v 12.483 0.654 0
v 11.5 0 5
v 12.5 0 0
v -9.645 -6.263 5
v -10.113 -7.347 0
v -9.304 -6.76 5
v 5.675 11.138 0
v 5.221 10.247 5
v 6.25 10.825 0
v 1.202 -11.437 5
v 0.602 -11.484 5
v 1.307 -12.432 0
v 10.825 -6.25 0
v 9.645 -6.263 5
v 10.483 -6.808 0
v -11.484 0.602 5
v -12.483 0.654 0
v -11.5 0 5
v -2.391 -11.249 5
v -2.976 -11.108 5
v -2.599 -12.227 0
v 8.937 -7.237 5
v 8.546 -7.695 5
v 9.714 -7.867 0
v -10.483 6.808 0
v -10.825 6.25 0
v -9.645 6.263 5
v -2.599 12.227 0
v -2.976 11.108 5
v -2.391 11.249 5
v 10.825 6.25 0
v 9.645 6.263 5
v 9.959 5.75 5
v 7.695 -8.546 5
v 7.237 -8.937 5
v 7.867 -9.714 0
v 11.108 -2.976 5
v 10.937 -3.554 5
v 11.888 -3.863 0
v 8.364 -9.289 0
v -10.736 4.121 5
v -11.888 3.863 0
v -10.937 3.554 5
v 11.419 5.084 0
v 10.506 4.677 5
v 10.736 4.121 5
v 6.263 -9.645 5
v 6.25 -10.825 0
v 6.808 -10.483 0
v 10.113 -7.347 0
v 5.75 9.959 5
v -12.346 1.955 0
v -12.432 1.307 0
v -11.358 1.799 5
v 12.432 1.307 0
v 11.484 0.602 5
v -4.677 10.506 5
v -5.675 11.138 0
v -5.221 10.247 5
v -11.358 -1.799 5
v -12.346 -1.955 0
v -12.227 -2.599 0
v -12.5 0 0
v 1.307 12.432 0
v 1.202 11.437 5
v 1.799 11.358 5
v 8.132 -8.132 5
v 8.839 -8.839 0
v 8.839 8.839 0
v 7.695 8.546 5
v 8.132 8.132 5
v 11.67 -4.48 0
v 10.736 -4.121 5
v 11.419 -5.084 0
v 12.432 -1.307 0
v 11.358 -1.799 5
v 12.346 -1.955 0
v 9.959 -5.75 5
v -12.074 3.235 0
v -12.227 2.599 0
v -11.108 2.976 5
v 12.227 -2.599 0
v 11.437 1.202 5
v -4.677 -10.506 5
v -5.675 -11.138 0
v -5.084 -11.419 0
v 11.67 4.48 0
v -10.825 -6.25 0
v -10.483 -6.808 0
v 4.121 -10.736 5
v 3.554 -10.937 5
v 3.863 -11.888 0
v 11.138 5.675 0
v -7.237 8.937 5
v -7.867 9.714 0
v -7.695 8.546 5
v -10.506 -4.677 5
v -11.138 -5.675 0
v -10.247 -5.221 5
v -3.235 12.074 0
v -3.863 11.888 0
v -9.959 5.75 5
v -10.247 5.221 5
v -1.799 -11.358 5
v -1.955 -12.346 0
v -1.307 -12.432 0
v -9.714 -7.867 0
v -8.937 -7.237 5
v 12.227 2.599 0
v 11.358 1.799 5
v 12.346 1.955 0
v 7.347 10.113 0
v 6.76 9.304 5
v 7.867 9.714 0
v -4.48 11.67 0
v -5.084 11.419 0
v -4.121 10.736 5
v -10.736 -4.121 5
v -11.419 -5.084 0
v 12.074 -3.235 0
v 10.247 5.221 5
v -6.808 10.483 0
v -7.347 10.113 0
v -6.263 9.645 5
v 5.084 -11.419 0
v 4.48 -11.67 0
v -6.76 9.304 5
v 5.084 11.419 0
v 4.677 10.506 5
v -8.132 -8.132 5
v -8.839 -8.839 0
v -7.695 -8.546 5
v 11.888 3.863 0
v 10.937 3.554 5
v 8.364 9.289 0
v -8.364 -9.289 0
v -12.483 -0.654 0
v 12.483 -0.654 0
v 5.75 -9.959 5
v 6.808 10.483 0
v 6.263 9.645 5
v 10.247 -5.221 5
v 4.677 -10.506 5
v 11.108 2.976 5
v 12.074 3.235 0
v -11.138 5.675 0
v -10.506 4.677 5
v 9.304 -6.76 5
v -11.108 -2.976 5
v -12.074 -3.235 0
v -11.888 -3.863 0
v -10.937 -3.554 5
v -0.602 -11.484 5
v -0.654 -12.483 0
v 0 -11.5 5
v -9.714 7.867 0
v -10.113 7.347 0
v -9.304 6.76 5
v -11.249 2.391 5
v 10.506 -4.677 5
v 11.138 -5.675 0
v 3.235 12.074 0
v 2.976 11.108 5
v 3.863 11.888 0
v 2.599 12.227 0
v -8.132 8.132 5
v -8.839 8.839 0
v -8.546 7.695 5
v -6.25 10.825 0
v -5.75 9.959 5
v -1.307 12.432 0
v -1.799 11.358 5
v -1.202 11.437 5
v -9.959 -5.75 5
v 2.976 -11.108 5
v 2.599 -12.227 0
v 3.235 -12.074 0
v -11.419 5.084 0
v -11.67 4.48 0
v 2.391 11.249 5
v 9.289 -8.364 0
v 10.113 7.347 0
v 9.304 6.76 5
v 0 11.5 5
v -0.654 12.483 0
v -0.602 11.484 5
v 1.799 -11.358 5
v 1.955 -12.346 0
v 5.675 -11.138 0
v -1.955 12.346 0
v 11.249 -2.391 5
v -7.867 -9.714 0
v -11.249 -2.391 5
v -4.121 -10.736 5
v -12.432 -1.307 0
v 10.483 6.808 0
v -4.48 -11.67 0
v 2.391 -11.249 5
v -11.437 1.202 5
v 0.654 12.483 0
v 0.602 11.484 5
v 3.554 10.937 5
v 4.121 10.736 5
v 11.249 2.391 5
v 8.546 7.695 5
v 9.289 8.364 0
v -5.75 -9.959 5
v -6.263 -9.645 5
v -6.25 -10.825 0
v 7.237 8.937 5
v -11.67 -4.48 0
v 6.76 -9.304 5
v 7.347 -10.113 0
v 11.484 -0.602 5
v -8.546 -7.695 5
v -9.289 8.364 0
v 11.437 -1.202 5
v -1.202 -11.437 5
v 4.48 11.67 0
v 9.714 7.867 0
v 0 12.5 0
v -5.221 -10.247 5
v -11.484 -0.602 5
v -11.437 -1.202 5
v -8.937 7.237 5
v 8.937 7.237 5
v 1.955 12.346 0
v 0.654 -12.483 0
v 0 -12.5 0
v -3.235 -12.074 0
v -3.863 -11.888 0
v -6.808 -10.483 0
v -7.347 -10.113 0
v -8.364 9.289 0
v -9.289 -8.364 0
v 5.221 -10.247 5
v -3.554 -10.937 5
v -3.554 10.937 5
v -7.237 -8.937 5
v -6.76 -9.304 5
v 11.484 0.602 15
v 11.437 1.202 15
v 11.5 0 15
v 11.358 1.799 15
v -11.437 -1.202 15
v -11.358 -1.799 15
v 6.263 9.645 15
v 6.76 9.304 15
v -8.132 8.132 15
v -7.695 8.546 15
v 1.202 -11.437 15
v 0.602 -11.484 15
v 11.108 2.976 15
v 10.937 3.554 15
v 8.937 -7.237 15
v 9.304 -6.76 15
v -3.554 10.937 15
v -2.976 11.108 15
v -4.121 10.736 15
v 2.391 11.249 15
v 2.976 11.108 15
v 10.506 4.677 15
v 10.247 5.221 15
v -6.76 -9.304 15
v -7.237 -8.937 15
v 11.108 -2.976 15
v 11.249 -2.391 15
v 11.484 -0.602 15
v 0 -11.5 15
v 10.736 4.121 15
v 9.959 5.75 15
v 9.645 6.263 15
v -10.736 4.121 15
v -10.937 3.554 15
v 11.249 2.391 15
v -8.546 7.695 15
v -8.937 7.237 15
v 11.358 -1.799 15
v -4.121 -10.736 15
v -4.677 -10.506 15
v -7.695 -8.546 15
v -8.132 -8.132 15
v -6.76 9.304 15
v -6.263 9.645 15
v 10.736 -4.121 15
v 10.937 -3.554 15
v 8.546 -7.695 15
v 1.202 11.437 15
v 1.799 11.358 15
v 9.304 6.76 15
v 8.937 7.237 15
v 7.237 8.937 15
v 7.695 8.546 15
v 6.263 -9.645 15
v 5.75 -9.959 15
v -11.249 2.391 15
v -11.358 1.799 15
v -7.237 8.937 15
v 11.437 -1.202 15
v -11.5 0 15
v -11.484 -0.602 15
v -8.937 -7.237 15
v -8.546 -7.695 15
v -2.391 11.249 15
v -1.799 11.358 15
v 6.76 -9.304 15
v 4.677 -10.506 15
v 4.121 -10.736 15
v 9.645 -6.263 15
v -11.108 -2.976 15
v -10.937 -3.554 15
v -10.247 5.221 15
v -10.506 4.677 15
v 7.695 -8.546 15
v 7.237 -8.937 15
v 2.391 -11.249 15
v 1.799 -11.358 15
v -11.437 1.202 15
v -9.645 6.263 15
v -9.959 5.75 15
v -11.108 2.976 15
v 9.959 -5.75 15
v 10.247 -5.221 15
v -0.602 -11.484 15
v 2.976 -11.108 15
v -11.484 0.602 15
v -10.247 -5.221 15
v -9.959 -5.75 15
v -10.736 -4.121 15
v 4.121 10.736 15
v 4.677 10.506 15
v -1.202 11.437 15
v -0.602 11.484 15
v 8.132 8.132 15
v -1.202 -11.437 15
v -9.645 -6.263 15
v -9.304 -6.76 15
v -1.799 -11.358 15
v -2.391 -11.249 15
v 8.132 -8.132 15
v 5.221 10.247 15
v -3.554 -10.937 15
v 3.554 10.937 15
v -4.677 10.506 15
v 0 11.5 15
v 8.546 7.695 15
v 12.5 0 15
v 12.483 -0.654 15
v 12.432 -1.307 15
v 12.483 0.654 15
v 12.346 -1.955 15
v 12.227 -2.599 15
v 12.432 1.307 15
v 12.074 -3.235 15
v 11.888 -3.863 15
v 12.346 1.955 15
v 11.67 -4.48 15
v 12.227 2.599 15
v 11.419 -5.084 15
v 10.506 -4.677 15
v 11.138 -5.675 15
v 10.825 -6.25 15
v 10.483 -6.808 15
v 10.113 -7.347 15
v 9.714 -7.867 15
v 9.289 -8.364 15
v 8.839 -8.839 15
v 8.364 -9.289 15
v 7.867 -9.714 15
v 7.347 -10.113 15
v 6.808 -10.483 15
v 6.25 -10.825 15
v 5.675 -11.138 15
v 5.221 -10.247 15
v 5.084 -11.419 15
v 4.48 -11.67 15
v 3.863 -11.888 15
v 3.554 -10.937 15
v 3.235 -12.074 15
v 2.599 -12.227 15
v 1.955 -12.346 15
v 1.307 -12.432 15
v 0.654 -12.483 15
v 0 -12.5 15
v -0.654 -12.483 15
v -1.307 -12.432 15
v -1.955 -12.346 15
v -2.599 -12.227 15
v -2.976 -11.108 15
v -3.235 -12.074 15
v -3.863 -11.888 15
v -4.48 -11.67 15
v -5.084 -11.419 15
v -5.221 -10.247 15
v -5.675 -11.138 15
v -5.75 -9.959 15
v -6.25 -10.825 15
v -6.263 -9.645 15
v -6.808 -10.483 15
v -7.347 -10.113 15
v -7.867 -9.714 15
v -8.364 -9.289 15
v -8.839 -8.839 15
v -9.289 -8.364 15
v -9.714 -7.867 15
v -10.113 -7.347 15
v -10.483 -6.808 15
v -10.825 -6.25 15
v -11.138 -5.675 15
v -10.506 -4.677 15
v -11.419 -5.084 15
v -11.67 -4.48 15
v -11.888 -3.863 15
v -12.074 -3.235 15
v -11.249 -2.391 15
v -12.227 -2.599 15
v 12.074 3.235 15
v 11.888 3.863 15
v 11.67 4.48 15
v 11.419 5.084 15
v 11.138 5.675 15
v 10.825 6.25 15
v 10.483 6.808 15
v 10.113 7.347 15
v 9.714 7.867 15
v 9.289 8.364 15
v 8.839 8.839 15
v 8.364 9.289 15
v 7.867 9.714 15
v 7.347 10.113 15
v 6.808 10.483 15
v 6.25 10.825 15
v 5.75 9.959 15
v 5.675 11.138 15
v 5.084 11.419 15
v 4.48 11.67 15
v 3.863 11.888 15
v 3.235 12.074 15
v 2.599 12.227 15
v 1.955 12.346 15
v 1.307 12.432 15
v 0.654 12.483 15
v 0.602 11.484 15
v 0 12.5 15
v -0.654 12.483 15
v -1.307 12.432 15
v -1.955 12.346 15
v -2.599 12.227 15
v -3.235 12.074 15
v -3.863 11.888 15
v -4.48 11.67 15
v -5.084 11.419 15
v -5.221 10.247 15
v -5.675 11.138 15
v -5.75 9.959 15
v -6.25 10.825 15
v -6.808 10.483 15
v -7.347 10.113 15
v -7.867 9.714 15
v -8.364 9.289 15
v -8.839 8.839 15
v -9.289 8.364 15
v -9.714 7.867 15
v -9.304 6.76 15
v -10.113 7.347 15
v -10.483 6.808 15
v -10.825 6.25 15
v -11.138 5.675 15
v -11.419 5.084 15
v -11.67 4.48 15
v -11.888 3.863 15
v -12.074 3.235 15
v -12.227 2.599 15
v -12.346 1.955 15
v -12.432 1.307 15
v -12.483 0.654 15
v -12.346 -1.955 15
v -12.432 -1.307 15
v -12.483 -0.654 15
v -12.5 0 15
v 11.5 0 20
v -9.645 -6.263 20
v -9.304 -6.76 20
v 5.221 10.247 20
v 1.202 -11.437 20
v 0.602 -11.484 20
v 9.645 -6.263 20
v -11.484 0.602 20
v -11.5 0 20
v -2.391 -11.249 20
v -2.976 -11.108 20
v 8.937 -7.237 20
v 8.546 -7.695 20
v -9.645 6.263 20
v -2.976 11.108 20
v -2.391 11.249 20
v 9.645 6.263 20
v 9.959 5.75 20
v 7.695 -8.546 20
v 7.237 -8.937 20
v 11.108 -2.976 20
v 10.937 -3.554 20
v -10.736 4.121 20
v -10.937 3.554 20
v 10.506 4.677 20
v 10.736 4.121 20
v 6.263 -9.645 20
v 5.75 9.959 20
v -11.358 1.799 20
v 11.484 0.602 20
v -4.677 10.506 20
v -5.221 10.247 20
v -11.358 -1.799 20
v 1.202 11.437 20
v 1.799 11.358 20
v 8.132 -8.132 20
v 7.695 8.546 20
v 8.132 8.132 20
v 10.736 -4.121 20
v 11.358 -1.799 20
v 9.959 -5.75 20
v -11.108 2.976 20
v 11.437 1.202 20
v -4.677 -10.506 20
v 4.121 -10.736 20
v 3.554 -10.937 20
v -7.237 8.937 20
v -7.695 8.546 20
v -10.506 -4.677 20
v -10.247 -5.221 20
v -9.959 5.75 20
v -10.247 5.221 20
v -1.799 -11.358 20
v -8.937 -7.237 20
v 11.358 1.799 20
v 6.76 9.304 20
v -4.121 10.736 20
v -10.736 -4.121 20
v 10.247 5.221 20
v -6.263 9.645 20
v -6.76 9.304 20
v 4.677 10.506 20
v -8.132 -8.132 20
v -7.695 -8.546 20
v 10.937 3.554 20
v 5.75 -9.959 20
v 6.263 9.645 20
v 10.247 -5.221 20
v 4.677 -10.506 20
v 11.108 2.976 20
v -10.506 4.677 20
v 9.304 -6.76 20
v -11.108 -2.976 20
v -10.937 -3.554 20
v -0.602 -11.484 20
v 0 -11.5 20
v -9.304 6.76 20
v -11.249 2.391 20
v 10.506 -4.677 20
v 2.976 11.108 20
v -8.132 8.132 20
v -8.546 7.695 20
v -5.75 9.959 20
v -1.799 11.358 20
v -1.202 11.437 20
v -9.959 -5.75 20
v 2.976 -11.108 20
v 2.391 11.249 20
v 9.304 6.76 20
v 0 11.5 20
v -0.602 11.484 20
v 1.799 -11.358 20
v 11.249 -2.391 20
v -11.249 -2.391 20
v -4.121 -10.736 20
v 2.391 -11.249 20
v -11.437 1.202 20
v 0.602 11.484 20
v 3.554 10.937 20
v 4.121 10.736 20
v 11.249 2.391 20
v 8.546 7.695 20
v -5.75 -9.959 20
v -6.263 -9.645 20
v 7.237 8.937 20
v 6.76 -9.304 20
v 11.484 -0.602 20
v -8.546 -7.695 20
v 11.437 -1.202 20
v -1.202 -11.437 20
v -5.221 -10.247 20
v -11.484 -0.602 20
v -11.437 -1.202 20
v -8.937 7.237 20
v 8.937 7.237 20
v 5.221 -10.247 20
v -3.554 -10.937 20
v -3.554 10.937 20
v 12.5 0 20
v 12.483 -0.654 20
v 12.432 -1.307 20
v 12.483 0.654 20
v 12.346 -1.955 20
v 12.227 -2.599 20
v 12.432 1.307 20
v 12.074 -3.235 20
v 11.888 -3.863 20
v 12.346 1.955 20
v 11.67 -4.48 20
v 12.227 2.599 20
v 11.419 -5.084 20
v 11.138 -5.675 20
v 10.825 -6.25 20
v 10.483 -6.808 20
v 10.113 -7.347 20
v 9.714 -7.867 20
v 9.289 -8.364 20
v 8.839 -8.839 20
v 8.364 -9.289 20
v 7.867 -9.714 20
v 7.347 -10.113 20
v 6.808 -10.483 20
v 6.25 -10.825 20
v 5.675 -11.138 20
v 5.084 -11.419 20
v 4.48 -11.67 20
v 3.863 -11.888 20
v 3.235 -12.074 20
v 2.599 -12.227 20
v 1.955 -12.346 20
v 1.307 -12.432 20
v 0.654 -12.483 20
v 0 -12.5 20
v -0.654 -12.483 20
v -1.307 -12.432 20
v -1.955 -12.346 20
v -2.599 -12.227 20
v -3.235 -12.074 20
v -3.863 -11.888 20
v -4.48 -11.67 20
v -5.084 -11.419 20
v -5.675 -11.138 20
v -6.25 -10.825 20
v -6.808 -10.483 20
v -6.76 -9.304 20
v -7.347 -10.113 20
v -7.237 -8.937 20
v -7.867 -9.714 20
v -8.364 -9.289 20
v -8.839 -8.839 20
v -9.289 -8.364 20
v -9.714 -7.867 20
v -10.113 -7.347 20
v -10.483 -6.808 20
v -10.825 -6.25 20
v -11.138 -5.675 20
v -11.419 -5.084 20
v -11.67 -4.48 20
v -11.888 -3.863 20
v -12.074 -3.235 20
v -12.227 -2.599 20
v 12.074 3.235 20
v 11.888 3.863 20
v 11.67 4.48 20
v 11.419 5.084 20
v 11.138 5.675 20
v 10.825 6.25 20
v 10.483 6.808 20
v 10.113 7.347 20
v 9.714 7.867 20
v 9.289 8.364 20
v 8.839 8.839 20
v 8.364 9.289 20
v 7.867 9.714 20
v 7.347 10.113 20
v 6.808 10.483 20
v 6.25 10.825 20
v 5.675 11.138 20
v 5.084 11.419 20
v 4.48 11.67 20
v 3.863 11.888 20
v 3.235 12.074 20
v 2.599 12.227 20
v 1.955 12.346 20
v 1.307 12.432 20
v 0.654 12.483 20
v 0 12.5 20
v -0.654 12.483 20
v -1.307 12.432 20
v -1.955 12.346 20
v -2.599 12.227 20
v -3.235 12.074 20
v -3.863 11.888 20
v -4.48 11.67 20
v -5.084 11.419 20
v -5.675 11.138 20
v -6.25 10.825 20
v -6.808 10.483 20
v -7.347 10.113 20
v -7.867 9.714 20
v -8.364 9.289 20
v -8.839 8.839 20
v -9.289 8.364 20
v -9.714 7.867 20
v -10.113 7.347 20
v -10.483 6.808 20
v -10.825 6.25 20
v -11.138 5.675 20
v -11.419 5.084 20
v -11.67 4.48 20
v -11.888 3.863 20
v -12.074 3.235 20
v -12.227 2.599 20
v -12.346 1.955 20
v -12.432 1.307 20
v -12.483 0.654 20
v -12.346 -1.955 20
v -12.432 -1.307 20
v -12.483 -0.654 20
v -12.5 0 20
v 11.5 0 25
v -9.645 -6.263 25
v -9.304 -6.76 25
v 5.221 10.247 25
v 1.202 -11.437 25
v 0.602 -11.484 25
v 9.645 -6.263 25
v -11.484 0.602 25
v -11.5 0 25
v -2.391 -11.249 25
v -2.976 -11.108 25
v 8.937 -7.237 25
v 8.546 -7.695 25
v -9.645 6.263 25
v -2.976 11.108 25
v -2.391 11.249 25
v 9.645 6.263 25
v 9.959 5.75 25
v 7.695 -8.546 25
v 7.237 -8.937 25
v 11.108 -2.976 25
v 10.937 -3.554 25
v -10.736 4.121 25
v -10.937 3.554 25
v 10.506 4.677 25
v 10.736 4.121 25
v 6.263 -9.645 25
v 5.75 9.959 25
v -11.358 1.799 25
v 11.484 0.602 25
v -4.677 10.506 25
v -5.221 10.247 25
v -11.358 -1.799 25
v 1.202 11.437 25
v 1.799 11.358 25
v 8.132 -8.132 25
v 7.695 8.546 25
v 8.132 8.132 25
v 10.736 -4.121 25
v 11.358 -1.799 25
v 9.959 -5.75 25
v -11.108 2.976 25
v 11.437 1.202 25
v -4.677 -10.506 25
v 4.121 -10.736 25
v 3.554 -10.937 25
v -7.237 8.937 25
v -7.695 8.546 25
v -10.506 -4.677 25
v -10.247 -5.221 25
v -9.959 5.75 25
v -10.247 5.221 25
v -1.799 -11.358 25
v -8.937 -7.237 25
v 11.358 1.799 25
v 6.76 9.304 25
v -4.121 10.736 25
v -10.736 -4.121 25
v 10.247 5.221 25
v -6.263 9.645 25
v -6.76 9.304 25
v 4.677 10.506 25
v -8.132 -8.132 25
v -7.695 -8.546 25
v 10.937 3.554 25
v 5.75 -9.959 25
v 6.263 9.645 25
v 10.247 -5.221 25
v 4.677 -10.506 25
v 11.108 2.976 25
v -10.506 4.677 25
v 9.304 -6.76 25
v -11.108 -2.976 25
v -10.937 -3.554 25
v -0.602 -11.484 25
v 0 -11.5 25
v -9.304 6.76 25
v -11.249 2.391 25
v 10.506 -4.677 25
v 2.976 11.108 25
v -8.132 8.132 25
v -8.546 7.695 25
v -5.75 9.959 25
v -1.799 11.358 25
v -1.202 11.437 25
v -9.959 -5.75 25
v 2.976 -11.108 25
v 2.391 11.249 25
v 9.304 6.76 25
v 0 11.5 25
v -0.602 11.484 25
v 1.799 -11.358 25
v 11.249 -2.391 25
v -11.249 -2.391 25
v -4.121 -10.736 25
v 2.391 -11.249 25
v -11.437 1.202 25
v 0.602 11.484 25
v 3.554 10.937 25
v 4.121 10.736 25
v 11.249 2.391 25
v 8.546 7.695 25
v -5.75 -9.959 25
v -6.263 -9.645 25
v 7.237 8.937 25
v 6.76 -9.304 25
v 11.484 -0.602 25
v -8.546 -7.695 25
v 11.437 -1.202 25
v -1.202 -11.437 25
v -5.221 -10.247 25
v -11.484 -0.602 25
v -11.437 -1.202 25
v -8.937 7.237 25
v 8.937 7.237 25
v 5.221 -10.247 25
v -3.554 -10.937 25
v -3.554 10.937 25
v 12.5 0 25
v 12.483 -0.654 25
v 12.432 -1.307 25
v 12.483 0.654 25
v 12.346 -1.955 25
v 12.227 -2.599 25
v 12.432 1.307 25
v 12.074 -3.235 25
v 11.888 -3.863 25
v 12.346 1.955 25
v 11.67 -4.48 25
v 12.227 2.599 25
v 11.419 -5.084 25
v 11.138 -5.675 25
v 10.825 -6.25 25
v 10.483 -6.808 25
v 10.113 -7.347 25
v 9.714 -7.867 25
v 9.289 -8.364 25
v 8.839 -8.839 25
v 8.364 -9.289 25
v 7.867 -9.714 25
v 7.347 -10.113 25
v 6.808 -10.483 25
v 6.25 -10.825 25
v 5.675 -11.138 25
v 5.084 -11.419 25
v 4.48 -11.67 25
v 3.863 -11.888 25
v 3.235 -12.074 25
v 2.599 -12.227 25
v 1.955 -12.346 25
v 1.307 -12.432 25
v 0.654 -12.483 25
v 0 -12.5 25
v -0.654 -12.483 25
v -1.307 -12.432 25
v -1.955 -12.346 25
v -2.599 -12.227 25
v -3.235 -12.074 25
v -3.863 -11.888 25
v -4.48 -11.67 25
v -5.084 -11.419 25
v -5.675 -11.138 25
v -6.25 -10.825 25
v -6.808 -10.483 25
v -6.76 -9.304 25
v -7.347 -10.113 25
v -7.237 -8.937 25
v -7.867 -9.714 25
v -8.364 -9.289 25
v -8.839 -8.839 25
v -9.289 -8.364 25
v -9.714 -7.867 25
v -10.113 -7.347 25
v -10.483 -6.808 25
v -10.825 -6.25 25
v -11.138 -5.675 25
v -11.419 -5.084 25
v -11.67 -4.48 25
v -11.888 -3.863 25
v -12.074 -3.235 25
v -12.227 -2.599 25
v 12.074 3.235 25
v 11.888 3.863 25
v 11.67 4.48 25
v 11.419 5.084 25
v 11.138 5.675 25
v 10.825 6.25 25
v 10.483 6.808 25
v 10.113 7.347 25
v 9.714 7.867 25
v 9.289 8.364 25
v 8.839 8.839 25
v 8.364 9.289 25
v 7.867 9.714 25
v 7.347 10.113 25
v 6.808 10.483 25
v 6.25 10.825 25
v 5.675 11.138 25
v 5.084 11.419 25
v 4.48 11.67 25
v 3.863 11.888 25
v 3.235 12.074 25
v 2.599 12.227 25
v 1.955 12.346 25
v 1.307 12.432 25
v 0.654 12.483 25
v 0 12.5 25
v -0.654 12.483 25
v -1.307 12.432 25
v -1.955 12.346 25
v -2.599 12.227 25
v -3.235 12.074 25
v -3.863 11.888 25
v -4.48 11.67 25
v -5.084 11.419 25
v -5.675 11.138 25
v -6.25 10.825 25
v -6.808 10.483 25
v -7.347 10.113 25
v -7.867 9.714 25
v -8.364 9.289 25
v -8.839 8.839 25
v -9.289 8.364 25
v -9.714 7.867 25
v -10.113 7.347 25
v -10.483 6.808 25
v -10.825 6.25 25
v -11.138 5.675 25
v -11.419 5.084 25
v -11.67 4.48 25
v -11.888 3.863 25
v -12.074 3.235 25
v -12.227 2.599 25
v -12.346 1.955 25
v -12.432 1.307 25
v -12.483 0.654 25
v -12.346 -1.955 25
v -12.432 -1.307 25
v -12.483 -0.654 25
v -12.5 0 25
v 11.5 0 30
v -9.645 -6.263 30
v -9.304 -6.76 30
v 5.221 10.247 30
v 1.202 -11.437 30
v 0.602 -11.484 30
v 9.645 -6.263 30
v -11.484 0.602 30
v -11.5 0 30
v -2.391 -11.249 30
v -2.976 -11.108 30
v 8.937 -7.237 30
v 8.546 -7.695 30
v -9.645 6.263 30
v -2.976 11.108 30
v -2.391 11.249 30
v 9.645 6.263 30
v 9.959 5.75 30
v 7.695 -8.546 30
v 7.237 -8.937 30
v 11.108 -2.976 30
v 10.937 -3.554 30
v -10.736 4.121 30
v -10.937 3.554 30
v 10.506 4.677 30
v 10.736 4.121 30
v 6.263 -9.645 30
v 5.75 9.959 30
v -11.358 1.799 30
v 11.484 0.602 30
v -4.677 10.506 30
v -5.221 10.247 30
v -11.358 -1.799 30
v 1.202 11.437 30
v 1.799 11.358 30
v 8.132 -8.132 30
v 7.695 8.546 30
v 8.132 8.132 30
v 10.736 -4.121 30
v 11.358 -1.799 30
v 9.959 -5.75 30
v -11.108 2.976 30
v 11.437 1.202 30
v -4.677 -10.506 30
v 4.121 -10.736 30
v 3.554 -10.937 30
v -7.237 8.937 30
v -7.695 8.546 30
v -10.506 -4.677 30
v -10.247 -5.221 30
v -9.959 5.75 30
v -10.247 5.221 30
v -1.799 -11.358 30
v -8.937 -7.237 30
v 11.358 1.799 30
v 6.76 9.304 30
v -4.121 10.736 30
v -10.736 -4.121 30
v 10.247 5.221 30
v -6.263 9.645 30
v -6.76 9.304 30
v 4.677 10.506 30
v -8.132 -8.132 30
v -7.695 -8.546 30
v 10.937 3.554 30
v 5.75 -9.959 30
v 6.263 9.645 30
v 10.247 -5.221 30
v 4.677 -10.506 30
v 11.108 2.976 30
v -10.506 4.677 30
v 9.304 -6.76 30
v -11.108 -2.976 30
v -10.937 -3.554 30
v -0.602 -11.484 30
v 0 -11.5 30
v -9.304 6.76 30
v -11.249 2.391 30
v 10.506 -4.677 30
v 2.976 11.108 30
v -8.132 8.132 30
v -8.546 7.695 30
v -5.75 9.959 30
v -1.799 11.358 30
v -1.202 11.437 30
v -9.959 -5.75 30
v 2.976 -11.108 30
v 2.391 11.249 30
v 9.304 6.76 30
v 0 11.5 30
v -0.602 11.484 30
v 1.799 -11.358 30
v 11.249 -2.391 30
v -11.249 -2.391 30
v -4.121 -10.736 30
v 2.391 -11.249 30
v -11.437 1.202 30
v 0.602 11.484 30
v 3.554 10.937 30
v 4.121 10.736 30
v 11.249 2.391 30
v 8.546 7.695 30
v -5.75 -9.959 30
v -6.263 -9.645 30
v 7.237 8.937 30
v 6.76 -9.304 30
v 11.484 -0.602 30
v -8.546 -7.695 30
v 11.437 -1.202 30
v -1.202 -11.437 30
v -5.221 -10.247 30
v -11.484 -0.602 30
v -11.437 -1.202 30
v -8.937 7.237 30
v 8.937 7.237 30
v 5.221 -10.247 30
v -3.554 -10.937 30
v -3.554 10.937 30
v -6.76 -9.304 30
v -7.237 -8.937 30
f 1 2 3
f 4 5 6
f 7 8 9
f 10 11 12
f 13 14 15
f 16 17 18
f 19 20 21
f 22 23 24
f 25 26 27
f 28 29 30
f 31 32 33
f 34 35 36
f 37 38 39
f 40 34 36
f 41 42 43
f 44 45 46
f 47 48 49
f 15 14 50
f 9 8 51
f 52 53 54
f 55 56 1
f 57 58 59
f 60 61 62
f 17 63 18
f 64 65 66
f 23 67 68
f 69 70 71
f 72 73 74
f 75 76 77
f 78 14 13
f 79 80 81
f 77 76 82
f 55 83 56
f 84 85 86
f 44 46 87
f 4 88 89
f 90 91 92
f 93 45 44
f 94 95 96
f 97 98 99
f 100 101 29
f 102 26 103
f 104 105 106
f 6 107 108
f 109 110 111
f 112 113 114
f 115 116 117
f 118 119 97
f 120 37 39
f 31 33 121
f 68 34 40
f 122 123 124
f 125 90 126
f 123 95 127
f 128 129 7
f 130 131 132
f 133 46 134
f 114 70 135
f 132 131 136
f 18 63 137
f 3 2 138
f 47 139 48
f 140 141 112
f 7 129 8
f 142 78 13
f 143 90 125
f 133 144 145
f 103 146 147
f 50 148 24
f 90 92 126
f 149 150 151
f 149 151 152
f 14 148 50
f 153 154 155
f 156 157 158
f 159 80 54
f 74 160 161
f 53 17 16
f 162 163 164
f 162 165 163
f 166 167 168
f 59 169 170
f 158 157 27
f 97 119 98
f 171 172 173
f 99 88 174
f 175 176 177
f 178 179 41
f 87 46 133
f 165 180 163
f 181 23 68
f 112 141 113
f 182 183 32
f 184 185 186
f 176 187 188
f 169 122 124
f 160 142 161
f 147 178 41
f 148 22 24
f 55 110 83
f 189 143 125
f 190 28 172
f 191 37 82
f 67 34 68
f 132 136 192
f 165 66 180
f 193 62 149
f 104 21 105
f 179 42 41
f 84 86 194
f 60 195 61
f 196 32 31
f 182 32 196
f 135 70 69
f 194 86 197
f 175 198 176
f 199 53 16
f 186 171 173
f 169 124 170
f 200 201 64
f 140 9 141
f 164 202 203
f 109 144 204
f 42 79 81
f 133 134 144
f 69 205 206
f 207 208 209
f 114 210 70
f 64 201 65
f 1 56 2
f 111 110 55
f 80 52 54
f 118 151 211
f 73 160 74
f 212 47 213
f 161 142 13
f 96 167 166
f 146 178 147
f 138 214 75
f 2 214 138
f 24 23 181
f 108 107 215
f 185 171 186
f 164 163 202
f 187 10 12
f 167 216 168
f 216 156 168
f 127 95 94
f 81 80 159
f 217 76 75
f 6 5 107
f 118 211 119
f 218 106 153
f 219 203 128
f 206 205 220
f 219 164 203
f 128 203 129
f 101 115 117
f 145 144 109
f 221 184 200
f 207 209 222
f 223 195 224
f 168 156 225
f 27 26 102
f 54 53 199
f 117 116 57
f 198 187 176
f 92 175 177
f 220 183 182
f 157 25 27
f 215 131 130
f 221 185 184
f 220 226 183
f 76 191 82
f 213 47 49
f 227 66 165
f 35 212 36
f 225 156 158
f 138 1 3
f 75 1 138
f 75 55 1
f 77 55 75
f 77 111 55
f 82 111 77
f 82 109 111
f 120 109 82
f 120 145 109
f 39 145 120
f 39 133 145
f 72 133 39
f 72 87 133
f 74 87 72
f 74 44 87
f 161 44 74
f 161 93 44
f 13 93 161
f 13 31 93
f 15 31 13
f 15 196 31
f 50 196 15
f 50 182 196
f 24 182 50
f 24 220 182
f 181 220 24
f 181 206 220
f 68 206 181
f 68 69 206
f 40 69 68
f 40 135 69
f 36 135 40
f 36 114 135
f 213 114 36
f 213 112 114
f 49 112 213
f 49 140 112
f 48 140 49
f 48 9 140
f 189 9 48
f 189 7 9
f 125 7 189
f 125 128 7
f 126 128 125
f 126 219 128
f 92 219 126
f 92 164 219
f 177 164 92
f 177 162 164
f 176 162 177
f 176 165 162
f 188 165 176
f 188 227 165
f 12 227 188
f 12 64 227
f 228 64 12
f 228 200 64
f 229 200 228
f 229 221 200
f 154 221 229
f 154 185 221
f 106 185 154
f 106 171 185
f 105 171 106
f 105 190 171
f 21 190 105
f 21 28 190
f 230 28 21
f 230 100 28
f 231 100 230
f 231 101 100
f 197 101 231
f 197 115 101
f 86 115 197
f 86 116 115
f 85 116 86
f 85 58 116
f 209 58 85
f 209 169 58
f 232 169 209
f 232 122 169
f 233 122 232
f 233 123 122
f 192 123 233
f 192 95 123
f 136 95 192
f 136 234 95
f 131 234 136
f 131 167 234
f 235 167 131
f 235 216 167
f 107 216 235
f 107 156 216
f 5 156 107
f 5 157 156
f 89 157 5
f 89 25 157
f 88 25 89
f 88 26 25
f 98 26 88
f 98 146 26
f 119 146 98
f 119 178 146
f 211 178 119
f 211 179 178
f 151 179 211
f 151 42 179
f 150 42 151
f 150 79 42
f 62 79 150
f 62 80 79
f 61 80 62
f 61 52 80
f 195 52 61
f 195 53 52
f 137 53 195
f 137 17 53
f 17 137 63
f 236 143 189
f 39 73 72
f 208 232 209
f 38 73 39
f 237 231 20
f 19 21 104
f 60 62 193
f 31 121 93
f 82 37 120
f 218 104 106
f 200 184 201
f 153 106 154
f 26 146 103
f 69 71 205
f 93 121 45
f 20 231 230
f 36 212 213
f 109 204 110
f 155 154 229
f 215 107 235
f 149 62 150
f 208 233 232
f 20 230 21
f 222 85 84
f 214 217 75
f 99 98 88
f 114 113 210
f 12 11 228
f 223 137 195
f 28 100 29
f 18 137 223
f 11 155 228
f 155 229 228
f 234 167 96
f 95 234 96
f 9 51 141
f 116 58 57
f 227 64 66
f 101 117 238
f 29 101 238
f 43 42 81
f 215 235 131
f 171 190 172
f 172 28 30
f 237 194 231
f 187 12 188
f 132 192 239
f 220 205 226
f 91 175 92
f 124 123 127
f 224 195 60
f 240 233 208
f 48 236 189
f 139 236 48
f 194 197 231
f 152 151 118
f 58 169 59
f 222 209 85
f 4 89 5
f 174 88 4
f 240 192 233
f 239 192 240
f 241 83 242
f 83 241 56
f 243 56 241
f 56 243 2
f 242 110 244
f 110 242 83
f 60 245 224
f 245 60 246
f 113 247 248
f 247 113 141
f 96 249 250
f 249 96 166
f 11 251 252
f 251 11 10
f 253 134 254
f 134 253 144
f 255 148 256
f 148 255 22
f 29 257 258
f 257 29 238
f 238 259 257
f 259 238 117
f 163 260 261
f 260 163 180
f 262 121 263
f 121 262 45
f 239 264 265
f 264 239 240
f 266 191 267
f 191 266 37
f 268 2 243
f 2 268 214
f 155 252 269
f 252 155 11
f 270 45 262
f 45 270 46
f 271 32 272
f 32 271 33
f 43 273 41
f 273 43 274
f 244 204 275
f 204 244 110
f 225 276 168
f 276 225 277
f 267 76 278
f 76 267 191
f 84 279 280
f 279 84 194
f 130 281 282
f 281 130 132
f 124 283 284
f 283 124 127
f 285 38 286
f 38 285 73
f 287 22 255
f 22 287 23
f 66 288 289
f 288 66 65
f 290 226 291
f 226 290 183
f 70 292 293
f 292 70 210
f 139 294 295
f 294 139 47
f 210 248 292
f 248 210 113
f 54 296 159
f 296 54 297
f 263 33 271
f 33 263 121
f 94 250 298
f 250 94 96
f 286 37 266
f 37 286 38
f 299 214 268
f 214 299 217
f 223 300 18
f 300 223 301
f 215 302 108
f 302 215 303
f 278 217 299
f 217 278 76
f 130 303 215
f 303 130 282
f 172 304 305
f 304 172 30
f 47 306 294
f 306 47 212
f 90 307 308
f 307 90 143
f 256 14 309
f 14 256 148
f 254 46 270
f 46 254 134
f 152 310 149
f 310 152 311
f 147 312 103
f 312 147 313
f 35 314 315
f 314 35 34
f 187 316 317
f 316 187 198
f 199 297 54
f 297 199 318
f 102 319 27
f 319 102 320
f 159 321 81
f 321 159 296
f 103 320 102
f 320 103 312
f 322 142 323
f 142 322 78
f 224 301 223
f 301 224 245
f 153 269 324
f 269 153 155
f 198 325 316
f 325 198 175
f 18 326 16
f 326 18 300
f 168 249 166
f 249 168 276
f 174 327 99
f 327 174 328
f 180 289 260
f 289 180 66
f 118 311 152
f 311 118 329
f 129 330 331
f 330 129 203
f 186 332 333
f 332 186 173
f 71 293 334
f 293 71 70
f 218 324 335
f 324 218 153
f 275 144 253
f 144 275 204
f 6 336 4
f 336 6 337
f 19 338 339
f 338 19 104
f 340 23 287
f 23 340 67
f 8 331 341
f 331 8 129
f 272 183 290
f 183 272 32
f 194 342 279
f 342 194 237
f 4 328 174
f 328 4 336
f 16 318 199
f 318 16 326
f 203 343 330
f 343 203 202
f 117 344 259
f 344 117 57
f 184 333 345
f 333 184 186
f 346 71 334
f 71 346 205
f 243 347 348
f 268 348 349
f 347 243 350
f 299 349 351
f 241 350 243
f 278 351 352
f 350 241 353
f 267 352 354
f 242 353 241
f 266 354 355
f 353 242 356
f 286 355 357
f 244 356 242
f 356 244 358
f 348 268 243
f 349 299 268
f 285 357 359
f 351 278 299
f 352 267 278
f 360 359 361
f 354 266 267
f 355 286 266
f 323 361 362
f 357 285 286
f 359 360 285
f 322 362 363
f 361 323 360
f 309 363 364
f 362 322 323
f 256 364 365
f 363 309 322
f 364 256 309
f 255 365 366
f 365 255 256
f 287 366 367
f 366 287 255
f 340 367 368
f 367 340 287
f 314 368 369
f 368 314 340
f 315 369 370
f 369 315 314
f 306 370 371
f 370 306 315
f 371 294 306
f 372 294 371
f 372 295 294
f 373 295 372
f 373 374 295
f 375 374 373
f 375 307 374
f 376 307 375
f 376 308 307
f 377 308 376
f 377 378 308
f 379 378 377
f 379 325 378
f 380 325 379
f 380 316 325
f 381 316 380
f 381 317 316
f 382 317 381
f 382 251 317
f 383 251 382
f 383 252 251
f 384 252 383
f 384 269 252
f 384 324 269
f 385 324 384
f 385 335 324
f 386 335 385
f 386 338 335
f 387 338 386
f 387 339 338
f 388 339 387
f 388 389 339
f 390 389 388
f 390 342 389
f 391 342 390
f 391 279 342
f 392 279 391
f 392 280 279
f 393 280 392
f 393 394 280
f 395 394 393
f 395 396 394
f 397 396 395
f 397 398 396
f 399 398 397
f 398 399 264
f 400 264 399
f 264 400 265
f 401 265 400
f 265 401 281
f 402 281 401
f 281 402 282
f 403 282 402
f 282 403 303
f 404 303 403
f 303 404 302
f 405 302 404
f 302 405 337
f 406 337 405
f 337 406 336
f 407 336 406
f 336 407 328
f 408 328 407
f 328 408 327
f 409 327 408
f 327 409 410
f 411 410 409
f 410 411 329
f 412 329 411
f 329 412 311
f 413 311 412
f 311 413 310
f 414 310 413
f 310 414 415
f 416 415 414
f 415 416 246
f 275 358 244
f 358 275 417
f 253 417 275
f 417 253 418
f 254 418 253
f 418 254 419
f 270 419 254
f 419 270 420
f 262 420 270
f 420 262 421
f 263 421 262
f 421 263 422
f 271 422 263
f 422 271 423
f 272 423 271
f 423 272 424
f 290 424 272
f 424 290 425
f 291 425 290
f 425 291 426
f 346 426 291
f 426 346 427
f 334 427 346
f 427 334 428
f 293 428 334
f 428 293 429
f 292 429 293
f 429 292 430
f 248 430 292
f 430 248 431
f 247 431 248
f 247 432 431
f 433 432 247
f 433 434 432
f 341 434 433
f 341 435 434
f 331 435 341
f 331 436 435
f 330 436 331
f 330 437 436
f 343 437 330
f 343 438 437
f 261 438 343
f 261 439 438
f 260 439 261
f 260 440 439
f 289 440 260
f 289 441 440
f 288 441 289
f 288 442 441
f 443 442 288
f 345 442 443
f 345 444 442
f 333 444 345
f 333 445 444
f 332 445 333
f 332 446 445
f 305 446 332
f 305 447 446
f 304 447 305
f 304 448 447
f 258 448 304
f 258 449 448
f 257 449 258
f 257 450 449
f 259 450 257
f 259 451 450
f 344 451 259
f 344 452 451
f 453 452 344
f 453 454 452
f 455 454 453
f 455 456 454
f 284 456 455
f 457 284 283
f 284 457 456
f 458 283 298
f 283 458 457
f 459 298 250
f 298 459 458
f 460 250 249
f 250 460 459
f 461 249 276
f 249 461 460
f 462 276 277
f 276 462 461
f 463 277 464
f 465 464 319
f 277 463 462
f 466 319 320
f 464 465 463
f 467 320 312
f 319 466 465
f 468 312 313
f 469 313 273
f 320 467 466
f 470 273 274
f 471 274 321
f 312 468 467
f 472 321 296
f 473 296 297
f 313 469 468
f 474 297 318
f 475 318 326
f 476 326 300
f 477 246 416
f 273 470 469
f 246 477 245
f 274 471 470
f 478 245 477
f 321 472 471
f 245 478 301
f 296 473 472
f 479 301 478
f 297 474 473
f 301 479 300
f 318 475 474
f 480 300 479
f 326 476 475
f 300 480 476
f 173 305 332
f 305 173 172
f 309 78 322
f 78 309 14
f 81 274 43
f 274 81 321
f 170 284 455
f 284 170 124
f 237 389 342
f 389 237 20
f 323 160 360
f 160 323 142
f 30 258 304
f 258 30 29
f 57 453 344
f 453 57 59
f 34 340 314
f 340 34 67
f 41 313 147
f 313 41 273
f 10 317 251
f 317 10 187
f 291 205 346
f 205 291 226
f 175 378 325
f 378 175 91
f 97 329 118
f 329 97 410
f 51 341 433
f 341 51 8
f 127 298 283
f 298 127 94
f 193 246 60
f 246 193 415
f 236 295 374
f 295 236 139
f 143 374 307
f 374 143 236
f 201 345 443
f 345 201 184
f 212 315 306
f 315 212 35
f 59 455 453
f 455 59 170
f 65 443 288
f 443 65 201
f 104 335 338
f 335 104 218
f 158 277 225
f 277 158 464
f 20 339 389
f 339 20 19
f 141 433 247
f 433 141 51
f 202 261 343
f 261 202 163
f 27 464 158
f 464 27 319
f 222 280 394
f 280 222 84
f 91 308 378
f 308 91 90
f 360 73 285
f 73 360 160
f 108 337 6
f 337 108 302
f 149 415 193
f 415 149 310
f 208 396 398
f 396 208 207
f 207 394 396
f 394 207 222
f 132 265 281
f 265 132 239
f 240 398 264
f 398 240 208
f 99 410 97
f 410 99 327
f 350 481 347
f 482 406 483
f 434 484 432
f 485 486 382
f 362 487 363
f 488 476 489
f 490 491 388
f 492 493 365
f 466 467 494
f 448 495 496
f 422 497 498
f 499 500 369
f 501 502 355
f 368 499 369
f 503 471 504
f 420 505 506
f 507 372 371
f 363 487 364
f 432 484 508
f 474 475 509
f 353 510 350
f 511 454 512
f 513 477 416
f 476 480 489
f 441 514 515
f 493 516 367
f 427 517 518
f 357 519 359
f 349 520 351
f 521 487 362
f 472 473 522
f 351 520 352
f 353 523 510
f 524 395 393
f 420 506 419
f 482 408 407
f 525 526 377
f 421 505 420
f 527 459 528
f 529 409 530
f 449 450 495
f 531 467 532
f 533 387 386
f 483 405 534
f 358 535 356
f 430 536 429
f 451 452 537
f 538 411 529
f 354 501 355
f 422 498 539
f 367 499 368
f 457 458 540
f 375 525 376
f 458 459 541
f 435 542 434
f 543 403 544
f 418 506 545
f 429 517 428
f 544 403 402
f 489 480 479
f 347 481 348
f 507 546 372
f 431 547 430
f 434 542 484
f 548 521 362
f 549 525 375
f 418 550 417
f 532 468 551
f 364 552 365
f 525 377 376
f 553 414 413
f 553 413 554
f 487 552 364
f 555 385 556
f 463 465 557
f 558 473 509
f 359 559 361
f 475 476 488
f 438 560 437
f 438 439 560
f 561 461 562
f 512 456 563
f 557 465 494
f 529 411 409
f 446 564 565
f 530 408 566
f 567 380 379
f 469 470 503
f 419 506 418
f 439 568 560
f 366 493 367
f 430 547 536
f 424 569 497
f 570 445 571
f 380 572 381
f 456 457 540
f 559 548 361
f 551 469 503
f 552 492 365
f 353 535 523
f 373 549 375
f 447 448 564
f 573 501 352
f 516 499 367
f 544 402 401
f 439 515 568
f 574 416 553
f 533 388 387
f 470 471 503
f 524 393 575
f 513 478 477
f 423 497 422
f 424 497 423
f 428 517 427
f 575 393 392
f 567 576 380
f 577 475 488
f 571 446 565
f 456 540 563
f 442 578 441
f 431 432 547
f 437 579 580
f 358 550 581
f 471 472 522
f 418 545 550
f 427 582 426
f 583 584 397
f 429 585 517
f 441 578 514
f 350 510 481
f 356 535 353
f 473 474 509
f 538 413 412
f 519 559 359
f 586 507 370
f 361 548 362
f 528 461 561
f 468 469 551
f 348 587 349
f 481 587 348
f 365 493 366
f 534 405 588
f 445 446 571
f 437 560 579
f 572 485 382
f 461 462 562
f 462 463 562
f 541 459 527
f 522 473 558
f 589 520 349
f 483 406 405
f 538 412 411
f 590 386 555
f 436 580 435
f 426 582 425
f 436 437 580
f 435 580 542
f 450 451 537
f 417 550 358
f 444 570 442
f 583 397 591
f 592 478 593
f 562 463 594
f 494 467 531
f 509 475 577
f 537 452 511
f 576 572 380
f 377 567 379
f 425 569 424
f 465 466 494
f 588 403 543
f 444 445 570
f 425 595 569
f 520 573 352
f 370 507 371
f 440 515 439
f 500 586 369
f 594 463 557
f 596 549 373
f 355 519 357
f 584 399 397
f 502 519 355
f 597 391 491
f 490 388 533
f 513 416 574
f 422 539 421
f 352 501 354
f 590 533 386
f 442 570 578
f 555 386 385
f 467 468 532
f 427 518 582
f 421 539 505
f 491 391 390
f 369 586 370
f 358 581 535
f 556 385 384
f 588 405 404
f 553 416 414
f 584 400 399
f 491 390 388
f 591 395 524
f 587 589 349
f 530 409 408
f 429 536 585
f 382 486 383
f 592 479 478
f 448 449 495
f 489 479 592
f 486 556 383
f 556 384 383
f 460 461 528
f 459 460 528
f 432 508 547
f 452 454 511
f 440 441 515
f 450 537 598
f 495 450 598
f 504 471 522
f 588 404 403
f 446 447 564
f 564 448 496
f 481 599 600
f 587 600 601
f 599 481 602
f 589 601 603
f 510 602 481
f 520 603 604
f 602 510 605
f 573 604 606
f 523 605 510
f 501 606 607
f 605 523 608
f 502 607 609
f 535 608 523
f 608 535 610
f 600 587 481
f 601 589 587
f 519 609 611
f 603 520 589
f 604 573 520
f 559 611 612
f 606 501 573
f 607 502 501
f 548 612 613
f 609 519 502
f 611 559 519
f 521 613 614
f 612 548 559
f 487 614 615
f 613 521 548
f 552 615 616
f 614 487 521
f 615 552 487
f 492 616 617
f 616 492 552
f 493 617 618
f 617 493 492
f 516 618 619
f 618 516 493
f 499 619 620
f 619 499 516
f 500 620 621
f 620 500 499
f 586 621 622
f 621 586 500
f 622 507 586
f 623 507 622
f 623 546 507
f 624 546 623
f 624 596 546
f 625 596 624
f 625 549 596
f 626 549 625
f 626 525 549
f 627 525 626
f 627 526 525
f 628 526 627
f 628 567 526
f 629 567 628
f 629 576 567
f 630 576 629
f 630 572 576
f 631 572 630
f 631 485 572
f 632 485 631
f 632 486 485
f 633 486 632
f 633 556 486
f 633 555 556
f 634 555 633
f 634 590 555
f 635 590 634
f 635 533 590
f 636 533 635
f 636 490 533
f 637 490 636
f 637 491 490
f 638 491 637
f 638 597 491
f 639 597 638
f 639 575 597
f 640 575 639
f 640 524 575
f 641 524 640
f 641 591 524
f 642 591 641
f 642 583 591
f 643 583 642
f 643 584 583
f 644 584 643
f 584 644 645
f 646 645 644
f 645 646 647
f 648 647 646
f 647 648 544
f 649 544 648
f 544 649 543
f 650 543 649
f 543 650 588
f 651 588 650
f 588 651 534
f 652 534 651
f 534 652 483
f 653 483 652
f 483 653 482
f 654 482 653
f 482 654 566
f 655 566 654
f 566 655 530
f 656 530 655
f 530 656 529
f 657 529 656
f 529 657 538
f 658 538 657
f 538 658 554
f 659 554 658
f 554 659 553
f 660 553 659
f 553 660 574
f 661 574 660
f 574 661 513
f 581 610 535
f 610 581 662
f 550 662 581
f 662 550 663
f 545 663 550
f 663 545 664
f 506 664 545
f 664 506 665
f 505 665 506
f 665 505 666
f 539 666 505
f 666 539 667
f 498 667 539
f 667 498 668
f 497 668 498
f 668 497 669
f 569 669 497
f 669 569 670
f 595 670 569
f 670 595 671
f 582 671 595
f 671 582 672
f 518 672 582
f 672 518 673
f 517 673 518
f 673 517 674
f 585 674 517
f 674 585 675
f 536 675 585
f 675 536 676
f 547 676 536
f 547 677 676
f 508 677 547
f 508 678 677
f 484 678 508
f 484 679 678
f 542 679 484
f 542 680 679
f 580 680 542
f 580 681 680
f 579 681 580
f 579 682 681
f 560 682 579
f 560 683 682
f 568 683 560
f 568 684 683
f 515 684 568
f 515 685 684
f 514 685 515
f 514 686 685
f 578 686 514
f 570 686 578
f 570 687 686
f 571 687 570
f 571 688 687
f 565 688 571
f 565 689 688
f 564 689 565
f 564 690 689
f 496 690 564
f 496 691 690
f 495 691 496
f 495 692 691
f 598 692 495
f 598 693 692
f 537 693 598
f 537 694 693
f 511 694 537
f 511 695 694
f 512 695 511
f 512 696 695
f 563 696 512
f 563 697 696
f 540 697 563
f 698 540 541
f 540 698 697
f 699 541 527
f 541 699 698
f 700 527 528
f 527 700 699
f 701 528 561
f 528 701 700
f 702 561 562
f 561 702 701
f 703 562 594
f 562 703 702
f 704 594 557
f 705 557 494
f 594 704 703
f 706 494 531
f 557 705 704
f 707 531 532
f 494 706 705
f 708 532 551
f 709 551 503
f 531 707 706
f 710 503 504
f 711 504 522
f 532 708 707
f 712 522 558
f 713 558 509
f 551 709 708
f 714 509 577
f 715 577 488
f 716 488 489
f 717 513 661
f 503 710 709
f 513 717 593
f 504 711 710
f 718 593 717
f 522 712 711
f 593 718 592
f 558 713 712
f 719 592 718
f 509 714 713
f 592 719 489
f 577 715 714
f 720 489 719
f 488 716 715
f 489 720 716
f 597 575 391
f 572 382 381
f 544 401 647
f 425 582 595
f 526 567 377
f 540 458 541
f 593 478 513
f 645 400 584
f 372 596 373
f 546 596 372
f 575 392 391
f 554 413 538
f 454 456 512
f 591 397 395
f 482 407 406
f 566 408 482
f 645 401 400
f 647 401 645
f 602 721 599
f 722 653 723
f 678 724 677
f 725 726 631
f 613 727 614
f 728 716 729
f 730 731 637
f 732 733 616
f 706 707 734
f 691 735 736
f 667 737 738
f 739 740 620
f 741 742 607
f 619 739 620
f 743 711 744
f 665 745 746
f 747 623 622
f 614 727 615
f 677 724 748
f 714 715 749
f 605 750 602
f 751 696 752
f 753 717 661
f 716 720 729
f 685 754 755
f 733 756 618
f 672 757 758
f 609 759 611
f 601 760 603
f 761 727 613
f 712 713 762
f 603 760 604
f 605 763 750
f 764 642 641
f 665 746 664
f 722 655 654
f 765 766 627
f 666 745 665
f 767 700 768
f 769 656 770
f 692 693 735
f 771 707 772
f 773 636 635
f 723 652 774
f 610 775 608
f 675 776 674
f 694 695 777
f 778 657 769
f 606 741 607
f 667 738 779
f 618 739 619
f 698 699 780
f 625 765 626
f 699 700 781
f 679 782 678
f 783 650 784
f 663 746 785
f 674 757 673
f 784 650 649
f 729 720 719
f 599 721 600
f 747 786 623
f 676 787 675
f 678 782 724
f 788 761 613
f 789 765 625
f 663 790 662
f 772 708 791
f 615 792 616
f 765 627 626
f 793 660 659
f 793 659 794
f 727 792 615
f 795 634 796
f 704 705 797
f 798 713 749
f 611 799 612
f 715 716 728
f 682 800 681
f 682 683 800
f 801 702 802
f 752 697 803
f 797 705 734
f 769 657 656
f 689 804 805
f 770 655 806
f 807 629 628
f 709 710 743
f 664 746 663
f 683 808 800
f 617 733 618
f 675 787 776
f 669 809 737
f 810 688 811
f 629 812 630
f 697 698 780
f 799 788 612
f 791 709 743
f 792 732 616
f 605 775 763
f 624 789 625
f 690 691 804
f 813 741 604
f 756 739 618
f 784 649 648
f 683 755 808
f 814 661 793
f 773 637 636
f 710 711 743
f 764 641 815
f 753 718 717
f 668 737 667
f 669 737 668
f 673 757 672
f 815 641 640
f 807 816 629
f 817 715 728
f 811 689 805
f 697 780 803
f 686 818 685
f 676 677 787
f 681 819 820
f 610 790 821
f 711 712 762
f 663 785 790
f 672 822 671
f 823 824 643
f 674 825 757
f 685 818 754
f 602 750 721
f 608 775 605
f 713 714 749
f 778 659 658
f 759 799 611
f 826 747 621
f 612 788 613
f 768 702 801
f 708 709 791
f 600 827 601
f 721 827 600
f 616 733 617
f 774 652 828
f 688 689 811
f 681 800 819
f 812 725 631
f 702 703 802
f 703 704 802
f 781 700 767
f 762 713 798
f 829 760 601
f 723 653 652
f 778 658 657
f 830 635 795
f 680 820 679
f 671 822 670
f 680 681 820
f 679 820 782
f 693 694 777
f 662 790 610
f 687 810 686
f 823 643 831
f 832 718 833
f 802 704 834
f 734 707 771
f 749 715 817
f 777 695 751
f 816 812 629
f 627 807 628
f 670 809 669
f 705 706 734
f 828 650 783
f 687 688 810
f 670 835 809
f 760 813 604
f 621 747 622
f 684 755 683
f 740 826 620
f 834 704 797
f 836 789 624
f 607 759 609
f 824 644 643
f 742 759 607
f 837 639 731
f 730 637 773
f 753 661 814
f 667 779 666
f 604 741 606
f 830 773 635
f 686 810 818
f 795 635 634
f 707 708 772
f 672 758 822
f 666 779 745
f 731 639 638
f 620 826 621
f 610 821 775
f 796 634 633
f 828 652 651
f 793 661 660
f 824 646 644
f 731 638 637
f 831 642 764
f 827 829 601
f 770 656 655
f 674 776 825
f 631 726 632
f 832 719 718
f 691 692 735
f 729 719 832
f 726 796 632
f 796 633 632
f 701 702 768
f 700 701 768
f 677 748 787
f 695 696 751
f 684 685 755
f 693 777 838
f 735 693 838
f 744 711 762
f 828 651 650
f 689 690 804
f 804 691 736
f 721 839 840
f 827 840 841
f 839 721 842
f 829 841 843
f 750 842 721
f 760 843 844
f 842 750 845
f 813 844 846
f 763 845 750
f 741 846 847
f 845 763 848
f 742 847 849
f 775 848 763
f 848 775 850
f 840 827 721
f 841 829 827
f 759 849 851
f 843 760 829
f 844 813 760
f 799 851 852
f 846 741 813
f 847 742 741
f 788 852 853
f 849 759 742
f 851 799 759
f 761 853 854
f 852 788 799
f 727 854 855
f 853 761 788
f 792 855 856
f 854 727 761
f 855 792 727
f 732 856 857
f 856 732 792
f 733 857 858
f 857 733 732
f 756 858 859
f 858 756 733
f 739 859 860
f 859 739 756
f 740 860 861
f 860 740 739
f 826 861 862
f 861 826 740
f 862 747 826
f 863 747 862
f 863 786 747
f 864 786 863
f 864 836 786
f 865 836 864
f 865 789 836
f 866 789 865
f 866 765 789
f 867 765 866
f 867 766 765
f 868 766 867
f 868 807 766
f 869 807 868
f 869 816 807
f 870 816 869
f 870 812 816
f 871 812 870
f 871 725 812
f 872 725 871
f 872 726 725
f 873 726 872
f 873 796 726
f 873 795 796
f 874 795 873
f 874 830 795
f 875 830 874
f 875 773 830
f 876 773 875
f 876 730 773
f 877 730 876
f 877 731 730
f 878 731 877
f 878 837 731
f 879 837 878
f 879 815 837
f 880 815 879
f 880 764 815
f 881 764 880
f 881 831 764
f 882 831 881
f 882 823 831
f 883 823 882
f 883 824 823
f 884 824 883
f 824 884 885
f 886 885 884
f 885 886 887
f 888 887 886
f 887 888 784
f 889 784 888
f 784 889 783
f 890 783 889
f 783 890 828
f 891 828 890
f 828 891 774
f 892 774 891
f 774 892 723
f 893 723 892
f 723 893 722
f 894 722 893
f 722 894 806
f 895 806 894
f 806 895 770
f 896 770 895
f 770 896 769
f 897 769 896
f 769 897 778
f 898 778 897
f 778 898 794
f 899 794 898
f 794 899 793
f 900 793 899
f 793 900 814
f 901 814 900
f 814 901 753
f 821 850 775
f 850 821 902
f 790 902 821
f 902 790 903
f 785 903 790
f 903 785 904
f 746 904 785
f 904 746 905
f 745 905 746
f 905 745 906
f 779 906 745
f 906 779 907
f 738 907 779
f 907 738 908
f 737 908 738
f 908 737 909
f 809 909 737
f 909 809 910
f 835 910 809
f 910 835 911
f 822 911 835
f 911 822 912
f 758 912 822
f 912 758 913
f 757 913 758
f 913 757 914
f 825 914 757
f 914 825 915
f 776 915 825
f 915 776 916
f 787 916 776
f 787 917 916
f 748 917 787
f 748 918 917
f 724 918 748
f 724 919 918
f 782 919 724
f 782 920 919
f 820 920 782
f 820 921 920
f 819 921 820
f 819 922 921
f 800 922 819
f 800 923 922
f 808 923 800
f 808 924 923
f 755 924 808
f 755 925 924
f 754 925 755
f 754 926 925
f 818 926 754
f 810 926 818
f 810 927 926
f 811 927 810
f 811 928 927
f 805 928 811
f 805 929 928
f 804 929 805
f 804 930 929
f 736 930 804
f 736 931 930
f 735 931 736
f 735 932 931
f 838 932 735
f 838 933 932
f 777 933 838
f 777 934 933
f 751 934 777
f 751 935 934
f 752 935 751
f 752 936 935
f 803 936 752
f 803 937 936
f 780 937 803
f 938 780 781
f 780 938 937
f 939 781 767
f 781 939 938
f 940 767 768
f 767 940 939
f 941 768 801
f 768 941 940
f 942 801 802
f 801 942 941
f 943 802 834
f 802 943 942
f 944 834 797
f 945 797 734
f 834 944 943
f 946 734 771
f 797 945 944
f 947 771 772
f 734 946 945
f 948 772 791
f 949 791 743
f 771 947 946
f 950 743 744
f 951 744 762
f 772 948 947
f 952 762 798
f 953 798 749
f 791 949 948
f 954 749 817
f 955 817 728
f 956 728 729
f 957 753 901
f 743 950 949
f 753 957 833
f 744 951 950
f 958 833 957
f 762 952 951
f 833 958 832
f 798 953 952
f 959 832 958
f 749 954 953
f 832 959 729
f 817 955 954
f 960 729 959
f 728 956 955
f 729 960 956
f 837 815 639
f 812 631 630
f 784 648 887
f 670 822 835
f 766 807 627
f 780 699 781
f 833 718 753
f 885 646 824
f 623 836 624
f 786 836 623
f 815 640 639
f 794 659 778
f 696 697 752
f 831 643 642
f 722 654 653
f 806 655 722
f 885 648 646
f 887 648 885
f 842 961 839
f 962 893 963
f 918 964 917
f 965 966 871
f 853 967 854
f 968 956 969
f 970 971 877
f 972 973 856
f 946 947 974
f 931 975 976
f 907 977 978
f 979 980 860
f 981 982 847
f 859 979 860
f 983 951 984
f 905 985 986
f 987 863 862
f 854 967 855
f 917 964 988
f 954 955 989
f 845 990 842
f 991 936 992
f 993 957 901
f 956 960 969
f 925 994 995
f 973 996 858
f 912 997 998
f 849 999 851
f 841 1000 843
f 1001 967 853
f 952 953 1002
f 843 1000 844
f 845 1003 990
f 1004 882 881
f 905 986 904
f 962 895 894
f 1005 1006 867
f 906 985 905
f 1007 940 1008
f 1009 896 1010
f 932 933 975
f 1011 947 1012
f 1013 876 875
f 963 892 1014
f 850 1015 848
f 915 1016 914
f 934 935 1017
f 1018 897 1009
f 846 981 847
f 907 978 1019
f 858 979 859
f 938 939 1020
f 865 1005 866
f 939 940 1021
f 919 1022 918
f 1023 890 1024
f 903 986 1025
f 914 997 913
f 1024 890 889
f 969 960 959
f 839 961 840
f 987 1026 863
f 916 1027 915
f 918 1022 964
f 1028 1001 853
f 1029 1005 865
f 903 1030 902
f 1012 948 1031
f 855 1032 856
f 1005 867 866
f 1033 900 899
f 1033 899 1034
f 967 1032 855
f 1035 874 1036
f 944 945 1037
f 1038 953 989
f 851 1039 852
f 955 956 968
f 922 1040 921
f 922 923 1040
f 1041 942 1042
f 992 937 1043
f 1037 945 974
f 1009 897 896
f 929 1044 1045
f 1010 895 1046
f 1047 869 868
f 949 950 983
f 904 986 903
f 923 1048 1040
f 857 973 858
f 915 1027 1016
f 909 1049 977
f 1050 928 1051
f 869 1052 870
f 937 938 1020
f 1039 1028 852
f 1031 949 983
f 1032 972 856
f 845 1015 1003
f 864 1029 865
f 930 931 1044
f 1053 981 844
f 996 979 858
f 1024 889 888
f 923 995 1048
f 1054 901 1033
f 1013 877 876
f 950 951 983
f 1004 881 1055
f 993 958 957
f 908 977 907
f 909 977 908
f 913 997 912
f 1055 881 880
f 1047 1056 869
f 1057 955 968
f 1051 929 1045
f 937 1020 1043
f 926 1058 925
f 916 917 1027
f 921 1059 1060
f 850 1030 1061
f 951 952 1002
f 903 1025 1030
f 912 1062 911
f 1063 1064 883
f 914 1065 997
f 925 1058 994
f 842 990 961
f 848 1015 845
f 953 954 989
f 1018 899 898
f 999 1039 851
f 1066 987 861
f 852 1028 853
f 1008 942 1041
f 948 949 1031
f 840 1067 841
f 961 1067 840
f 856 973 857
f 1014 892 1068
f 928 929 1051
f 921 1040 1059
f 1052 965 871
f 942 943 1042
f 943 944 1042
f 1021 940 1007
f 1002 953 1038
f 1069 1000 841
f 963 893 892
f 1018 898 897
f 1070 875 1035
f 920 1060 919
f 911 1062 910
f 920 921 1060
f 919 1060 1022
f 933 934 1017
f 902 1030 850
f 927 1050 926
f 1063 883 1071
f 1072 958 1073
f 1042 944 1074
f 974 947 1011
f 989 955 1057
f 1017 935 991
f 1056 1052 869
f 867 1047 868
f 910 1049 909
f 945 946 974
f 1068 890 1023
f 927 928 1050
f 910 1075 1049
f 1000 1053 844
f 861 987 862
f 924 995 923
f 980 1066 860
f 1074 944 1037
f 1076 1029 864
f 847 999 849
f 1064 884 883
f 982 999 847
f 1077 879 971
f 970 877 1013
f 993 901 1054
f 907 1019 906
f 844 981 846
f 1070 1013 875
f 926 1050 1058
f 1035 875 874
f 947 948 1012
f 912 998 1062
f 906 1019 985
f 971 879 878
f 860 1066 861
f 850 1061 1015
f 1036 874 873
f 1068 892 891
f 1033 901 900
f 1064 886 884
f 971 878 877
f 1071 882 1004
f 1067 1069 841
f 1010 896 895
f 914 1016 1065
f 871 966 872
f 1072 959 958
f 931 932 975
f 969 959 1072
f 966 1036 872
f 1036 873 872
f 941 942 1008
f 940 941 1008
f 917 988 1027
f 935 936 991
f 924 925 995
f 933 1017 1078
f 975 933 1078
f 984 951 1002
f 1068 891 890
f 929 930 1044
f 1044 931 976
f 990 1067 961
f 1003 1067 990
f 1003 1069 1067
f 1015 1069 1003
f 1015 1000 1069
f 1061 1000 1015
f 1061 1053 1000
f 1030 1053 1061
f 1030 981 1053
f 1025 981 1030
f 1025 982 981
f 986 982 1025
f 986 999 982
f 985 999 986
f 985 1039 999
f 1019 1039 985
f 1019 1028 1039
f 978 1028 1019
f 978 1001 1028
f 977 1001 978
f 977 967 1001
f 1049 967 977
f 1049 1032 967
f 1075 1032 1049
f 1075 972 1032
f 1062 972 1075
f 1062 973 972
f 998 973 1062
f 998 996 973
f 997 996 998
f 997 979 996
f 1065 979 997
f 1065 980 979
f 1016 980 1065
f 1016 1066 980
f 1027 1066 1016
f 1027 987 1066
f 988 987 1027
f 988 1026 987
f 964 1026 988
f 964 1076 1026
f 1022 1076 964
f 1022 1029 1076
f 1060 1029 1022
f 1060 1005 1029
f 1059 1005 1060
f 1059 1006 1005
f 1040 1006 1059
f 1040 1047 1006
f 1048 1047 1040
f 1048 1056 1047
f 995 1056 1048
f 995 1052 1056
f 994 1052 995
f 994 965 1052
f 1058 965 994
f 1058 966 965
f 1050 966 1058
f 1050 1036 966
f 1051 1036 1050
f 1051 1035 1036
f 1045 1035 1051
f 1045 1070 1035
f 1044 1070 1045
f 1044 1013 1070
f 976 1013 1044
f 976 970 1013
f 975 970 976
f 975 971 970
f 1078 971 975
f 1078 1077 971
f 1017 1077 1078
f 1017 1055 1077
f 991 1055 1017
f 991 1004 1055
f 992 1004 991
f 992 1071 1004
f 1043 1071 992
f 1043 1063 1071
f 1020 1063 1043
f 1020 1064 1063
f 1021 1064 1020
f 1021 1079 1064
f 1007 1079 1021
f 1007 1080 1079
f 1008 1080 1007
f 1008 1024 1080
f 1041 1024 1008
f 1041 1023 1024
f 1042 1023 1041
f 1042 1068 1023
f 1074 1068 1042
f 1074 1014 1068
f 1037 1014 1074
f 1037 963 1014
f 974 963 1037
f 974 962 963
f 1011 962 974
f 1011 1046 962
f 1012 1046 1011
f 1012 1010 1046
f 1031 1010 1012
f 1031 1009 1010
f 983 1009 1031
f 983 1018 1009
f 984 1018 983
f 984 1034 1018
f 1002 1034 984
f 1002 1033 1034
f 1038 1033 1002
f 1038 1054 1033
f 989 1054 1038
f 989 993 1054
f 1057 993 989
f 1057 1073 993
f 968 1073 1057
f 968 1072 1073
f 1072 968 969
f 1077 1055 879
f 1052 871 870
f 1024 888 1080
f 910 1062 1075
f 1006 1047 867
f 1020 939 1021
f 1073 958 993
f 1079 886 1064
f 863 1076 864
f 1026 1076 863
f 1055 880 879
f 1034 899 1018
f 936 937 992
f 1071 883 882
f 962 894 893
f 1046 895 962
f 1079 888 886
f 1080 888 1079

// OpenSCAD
// hose diameter
hose_diameter = 25;

// number of segments
n_segments = 5; // [1:1:10]

// segment smaller radius
segment_radius = 23;

// segment width
segment_width = 5;

// hose clamp segment diameter
clamp_diameter = 23;

// hose clamp segment width
clamp_width = 10;

// which segment is clamp segment
clamp_segment_ordinal = 2;

assert(clamp_segment_ordinal < n_segments, str("clamp segment ordinal cannot be greater than number of segments"));


$fn = $preview ? 30 : 120;

module _regular_segment()
{
    cylinder(d1=hose_diameter, d2=segment_radius, h=segment_width);
}


module _clamp_segment()
{
    cylinder(d=clamp_diameter, h=clamp_width);
}


module hose_plug()
{
    // lower segment
    for(i=[1:n_segments])
    {
        z_off = (i-(i<=clamp_segment_ordinal ? 1 : 2))*segment_width + (i>clamp_segment_ordinal ? 1 : 0)*clamp_width;

        translate([0,0,z_off])
            if(i==clamp_segment_ordinal)
            {
                _clamp_segment();
            }
            else
            {
                _regular_segment();
            }
    }
}

hose_plug();
